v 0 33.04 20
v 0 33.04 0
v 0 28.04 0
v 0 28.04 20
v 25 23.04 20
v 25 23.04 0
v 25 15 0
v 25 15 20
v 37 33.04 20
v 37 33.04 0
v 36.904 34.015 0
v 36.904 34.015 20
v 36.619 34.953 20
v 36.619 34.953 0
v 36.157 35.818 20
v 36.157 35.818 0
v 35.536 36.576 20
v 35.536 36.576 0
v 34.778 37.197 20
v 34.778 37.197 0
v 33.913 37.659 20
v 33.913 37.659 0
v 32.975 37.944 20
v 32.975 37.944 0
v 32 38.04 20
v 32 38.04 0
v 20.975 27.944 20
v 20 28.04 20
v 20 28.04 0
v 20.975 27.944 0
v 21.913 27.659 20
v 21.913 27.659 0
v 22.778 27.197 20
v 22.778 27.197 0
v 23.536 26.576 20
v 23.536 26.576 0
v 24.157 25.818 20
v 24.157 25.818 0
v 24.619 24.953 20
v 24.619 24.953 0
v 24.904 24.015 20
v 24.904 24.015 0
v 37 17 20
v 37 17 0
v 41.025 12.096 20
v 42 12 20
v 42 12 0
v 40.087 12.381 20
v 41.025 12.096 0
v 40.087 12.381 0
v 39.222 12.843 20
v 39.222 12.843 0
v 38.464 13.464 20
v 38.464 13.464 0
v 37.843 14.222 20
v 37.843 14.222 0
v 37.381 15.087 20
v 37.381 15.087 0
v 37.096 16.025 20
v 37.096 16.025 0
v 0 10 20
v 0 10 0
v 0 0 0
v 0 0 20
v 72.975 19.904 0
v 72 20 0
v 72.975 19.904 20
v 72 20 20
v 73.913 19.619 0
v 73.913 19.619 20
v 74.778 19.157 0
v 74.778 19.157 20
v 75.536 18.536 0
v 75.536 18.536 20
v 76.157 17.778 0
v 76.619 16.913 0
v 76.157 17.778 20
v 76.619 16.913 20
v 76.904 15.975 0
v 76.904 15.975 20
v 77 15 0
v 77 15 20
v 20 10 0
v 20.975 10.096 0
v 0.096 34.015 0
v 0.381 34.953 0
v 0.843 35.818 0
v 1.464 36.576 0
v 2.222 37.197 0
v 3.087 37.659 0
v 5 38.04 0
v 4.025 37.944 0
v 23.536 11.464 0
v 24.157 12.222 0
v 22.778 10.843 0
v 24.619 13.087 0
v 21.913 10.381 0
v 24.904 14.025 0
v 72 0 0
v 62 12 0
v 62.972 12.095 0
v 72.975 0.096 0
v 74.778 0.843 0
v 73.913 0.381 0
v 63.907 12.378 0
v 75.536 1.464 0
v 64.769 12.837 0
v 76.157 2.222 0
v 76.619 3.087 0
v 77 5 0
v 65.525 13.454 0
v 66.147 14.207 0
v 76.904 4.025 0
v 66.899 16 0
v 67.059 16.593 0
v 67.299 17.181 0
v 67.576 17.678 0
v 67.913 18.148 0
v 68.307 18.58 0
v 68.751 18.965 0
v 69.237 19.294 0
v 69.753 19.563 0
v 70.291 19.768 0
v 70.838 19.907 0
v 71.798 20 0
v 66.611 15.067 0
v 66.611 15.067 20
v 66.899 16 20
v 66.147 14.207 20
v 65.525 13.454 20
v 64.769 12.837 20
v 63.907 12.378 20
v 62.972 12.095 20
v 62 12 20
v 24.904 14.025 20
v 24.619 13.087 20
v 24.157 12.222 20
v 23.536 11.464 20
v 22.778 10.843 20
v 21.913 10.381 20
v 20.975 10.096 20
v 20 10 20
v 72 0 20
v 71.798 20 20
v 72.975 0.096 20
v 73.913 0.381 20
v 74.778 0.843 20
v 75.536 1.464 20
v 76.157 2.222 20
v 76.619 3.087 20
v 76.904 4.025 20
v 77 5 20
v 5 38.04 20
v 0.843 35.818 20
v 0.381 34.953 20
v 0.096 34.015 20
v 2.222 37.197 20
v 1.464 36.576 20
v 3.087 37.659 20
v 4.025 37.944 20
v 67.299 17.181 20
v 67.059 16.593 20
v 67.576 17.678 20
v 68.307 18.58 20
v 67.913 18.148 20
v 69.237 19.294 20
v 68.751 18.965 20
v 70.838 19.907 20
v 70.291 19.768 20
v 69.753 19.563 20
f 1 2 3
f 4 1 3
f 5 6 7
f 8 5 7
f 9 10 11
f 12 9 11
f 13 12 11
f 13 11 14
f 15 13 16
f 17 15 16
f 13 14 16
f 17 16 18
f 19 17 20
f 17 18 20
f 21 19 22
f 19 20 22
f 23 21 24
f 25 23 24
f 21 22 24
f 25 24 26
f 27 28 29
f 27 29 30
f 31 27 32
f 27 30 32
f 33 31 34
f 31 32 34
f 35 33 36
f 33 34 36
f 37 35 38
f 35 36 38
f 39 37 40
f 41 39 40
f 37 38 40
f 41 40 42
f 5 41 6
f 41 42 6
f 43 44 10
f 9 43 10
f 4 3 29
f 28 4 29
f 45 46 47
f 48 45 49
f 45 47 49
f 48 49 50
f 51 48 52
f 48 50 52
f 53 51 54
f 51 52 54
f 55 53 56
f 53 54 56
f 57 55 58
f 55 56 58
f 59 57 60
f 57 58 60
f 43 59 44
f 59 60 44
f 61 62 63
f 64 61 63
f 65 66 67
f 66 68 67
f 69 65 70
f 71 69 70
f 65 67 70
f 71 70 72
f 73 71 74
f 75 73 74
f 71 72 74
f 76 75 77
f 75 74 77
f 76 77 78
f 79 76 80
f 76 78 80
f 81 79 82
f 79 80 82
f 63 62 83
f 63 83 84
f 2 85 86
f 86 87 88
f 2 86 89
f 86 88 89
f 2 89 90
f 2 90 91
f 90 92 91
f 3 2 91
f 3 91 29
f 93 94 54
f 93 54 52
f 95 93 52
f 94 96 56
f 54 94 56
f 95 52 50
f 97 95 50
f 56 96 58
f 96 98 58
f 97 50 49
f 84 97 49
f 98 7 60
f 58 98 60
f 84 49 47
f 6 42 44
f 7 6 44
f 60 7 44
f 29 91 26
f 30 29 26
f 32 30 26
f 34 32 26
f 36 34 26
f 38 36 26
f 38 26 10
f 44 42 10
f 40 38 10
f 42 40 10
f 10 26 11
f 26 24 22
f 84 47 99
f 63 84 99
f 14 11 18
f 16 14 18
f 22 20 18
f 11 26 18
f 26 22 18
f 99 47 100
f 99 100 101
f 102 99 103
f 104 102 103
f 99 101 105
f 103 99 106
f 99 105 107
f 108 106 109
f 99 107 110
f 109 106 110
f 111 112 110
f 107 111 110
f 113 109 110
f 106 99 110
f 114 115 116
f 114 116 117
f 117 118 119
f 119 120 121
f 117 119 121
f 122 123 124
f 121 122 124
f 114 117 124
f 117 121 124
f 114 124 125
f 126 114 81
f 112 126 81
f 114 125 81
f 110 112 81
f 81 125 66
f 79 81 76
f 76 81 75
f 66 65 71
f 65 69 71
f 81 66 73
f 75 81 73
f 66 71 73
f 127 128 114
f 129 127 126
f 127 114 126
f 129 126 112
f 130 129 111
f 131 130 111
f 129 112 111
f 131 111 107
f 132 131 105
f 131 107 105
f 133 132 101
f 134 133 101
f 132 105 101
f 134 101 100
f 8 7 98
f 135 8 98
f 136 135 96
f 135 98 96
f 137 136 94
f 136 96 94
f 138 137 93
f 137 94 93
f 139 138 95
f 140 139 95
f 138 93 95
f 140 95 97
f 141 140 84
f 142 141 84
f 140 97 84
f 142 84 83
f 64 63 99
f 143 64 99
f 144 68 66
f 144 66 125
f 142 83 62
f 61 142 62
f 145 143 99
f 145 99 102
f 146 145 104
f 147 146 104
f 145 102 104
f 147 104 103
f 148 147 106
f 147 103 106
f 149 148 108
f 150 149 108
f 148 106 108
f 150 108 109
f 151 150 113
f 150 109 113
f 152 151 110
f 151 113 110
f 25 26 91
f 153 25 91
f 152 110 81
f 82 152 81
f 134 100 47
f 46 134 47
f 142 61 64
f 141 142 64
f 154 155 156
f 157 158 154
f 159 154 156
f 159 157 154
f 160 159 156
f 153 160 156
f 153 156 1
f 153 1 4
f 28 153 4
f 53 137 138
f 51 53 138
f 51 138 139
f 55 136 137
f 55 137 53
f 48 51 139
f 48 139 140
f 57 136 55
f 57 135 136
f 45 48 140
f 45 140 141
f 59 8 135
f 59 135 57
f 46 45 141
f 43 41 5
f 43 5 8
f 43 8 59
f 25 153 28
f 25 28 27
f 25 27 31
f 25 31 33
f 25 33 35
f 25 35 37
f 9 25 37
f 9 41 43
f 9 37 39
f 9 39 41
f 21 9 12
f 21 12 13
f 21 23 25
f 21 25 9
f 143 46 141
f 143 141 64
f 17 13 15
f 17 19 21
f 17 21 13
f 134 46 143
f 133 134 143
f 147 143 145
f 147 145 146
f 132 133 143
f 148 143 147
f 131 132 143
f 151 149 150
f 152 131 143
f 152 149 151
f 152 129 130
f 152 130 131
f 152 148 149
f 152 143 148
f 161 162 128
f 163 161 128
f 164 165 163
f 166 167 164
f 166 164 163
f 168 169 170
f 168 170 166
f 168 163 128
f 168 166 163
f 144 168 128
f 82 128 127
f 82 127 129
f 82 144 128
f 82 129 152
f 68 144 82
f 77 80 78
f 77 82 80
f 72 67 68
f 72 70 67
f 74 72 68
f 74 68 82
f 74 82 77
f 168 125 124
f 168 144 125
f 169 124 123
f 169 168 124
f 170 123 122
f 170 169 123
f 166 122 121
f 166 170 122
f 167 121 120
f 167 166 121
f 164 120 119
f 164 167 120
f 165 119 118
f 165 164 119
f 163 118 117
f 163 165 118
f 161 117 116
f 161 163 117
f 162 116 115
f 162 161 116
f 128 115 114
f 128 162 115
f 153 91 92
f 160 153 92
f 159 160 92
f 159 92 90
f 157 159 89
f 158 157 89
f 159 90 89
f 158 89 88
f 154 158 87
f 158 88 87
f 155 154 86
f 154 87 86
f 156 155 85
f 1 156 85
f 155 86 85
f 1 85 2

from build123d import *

# Parameters (mm, degrees)
F1_DEPTH = 20
F2_R     = 5
F3_R     = 5
F4_ANGLE = 90


with BuildPart() as f1:
    # F0 (on Front) → F1 (new body)
    with BuildSketch(Plane.XZ):
        with BuildLine():
            Line((32, 38.04), (5, 38.04))
            ThreePointArc((5, 38.04), (1.4644660941, 36.5755339059), (0, 33.04))
            Line((0, 33.04), (0, 28.04))
            Line((0, 28.04), (20, 28.04))
            ThreePointArc((20, 28.04), (23.5355339059, 26.5755339059), (25, 23.04))
            Line((25, 23.04), (25, 15))
            ThreePointArc((25, 15), (23.5355339059, 11.4644660941), (20, 10))
            Line((20, 10), (0, 10))
            Line((0, 10), (0, 0))
            Line((0, 0), (72, 0))
            ThreePointArc((72, 0), (75.5355339059, 1.4644660941), (77, 5))
            Line((77, 5), (77, 20))
            Line((77, 20), (67, 20))
            Line((67, 20), (67, 17))
            ThreePointArc((67, 17), (65.5355339059, 13.4644660941), (62, 12))
            Line((62, 12), (42, 12))
            ThreePointArc((42, 12), (38.4644660941, 13.4644660941), (37, 17))
            Line((37, 17), (37, 33.04))
            ThreePointArc((37, 33.04), (35.5355339059, 36.5755339059), (32, 38.04))
        make_face()
    extrude(amount=F1_DEPTH)

    # F2
    f2_edges = [f1.edges().sort_by_distance(p)[0] for p in [
        (67, -10, 20),
    ]]
    fillet(f2_edges, radius=F2_R)

    # F3
    f3_edges = [f1.edges().sort_by_distance(p)[0] for p in [
        (77, -10, 20),
    ]]
    fillet(f3_edges, radius=F3_R)


with BuildPart() as f1_1:
    # F4: moved
    add(f1.part.rotate(Axis((36, 0, 0), (-1, 0, 0)), F4_ANGLE))


solid = f1_1.part
